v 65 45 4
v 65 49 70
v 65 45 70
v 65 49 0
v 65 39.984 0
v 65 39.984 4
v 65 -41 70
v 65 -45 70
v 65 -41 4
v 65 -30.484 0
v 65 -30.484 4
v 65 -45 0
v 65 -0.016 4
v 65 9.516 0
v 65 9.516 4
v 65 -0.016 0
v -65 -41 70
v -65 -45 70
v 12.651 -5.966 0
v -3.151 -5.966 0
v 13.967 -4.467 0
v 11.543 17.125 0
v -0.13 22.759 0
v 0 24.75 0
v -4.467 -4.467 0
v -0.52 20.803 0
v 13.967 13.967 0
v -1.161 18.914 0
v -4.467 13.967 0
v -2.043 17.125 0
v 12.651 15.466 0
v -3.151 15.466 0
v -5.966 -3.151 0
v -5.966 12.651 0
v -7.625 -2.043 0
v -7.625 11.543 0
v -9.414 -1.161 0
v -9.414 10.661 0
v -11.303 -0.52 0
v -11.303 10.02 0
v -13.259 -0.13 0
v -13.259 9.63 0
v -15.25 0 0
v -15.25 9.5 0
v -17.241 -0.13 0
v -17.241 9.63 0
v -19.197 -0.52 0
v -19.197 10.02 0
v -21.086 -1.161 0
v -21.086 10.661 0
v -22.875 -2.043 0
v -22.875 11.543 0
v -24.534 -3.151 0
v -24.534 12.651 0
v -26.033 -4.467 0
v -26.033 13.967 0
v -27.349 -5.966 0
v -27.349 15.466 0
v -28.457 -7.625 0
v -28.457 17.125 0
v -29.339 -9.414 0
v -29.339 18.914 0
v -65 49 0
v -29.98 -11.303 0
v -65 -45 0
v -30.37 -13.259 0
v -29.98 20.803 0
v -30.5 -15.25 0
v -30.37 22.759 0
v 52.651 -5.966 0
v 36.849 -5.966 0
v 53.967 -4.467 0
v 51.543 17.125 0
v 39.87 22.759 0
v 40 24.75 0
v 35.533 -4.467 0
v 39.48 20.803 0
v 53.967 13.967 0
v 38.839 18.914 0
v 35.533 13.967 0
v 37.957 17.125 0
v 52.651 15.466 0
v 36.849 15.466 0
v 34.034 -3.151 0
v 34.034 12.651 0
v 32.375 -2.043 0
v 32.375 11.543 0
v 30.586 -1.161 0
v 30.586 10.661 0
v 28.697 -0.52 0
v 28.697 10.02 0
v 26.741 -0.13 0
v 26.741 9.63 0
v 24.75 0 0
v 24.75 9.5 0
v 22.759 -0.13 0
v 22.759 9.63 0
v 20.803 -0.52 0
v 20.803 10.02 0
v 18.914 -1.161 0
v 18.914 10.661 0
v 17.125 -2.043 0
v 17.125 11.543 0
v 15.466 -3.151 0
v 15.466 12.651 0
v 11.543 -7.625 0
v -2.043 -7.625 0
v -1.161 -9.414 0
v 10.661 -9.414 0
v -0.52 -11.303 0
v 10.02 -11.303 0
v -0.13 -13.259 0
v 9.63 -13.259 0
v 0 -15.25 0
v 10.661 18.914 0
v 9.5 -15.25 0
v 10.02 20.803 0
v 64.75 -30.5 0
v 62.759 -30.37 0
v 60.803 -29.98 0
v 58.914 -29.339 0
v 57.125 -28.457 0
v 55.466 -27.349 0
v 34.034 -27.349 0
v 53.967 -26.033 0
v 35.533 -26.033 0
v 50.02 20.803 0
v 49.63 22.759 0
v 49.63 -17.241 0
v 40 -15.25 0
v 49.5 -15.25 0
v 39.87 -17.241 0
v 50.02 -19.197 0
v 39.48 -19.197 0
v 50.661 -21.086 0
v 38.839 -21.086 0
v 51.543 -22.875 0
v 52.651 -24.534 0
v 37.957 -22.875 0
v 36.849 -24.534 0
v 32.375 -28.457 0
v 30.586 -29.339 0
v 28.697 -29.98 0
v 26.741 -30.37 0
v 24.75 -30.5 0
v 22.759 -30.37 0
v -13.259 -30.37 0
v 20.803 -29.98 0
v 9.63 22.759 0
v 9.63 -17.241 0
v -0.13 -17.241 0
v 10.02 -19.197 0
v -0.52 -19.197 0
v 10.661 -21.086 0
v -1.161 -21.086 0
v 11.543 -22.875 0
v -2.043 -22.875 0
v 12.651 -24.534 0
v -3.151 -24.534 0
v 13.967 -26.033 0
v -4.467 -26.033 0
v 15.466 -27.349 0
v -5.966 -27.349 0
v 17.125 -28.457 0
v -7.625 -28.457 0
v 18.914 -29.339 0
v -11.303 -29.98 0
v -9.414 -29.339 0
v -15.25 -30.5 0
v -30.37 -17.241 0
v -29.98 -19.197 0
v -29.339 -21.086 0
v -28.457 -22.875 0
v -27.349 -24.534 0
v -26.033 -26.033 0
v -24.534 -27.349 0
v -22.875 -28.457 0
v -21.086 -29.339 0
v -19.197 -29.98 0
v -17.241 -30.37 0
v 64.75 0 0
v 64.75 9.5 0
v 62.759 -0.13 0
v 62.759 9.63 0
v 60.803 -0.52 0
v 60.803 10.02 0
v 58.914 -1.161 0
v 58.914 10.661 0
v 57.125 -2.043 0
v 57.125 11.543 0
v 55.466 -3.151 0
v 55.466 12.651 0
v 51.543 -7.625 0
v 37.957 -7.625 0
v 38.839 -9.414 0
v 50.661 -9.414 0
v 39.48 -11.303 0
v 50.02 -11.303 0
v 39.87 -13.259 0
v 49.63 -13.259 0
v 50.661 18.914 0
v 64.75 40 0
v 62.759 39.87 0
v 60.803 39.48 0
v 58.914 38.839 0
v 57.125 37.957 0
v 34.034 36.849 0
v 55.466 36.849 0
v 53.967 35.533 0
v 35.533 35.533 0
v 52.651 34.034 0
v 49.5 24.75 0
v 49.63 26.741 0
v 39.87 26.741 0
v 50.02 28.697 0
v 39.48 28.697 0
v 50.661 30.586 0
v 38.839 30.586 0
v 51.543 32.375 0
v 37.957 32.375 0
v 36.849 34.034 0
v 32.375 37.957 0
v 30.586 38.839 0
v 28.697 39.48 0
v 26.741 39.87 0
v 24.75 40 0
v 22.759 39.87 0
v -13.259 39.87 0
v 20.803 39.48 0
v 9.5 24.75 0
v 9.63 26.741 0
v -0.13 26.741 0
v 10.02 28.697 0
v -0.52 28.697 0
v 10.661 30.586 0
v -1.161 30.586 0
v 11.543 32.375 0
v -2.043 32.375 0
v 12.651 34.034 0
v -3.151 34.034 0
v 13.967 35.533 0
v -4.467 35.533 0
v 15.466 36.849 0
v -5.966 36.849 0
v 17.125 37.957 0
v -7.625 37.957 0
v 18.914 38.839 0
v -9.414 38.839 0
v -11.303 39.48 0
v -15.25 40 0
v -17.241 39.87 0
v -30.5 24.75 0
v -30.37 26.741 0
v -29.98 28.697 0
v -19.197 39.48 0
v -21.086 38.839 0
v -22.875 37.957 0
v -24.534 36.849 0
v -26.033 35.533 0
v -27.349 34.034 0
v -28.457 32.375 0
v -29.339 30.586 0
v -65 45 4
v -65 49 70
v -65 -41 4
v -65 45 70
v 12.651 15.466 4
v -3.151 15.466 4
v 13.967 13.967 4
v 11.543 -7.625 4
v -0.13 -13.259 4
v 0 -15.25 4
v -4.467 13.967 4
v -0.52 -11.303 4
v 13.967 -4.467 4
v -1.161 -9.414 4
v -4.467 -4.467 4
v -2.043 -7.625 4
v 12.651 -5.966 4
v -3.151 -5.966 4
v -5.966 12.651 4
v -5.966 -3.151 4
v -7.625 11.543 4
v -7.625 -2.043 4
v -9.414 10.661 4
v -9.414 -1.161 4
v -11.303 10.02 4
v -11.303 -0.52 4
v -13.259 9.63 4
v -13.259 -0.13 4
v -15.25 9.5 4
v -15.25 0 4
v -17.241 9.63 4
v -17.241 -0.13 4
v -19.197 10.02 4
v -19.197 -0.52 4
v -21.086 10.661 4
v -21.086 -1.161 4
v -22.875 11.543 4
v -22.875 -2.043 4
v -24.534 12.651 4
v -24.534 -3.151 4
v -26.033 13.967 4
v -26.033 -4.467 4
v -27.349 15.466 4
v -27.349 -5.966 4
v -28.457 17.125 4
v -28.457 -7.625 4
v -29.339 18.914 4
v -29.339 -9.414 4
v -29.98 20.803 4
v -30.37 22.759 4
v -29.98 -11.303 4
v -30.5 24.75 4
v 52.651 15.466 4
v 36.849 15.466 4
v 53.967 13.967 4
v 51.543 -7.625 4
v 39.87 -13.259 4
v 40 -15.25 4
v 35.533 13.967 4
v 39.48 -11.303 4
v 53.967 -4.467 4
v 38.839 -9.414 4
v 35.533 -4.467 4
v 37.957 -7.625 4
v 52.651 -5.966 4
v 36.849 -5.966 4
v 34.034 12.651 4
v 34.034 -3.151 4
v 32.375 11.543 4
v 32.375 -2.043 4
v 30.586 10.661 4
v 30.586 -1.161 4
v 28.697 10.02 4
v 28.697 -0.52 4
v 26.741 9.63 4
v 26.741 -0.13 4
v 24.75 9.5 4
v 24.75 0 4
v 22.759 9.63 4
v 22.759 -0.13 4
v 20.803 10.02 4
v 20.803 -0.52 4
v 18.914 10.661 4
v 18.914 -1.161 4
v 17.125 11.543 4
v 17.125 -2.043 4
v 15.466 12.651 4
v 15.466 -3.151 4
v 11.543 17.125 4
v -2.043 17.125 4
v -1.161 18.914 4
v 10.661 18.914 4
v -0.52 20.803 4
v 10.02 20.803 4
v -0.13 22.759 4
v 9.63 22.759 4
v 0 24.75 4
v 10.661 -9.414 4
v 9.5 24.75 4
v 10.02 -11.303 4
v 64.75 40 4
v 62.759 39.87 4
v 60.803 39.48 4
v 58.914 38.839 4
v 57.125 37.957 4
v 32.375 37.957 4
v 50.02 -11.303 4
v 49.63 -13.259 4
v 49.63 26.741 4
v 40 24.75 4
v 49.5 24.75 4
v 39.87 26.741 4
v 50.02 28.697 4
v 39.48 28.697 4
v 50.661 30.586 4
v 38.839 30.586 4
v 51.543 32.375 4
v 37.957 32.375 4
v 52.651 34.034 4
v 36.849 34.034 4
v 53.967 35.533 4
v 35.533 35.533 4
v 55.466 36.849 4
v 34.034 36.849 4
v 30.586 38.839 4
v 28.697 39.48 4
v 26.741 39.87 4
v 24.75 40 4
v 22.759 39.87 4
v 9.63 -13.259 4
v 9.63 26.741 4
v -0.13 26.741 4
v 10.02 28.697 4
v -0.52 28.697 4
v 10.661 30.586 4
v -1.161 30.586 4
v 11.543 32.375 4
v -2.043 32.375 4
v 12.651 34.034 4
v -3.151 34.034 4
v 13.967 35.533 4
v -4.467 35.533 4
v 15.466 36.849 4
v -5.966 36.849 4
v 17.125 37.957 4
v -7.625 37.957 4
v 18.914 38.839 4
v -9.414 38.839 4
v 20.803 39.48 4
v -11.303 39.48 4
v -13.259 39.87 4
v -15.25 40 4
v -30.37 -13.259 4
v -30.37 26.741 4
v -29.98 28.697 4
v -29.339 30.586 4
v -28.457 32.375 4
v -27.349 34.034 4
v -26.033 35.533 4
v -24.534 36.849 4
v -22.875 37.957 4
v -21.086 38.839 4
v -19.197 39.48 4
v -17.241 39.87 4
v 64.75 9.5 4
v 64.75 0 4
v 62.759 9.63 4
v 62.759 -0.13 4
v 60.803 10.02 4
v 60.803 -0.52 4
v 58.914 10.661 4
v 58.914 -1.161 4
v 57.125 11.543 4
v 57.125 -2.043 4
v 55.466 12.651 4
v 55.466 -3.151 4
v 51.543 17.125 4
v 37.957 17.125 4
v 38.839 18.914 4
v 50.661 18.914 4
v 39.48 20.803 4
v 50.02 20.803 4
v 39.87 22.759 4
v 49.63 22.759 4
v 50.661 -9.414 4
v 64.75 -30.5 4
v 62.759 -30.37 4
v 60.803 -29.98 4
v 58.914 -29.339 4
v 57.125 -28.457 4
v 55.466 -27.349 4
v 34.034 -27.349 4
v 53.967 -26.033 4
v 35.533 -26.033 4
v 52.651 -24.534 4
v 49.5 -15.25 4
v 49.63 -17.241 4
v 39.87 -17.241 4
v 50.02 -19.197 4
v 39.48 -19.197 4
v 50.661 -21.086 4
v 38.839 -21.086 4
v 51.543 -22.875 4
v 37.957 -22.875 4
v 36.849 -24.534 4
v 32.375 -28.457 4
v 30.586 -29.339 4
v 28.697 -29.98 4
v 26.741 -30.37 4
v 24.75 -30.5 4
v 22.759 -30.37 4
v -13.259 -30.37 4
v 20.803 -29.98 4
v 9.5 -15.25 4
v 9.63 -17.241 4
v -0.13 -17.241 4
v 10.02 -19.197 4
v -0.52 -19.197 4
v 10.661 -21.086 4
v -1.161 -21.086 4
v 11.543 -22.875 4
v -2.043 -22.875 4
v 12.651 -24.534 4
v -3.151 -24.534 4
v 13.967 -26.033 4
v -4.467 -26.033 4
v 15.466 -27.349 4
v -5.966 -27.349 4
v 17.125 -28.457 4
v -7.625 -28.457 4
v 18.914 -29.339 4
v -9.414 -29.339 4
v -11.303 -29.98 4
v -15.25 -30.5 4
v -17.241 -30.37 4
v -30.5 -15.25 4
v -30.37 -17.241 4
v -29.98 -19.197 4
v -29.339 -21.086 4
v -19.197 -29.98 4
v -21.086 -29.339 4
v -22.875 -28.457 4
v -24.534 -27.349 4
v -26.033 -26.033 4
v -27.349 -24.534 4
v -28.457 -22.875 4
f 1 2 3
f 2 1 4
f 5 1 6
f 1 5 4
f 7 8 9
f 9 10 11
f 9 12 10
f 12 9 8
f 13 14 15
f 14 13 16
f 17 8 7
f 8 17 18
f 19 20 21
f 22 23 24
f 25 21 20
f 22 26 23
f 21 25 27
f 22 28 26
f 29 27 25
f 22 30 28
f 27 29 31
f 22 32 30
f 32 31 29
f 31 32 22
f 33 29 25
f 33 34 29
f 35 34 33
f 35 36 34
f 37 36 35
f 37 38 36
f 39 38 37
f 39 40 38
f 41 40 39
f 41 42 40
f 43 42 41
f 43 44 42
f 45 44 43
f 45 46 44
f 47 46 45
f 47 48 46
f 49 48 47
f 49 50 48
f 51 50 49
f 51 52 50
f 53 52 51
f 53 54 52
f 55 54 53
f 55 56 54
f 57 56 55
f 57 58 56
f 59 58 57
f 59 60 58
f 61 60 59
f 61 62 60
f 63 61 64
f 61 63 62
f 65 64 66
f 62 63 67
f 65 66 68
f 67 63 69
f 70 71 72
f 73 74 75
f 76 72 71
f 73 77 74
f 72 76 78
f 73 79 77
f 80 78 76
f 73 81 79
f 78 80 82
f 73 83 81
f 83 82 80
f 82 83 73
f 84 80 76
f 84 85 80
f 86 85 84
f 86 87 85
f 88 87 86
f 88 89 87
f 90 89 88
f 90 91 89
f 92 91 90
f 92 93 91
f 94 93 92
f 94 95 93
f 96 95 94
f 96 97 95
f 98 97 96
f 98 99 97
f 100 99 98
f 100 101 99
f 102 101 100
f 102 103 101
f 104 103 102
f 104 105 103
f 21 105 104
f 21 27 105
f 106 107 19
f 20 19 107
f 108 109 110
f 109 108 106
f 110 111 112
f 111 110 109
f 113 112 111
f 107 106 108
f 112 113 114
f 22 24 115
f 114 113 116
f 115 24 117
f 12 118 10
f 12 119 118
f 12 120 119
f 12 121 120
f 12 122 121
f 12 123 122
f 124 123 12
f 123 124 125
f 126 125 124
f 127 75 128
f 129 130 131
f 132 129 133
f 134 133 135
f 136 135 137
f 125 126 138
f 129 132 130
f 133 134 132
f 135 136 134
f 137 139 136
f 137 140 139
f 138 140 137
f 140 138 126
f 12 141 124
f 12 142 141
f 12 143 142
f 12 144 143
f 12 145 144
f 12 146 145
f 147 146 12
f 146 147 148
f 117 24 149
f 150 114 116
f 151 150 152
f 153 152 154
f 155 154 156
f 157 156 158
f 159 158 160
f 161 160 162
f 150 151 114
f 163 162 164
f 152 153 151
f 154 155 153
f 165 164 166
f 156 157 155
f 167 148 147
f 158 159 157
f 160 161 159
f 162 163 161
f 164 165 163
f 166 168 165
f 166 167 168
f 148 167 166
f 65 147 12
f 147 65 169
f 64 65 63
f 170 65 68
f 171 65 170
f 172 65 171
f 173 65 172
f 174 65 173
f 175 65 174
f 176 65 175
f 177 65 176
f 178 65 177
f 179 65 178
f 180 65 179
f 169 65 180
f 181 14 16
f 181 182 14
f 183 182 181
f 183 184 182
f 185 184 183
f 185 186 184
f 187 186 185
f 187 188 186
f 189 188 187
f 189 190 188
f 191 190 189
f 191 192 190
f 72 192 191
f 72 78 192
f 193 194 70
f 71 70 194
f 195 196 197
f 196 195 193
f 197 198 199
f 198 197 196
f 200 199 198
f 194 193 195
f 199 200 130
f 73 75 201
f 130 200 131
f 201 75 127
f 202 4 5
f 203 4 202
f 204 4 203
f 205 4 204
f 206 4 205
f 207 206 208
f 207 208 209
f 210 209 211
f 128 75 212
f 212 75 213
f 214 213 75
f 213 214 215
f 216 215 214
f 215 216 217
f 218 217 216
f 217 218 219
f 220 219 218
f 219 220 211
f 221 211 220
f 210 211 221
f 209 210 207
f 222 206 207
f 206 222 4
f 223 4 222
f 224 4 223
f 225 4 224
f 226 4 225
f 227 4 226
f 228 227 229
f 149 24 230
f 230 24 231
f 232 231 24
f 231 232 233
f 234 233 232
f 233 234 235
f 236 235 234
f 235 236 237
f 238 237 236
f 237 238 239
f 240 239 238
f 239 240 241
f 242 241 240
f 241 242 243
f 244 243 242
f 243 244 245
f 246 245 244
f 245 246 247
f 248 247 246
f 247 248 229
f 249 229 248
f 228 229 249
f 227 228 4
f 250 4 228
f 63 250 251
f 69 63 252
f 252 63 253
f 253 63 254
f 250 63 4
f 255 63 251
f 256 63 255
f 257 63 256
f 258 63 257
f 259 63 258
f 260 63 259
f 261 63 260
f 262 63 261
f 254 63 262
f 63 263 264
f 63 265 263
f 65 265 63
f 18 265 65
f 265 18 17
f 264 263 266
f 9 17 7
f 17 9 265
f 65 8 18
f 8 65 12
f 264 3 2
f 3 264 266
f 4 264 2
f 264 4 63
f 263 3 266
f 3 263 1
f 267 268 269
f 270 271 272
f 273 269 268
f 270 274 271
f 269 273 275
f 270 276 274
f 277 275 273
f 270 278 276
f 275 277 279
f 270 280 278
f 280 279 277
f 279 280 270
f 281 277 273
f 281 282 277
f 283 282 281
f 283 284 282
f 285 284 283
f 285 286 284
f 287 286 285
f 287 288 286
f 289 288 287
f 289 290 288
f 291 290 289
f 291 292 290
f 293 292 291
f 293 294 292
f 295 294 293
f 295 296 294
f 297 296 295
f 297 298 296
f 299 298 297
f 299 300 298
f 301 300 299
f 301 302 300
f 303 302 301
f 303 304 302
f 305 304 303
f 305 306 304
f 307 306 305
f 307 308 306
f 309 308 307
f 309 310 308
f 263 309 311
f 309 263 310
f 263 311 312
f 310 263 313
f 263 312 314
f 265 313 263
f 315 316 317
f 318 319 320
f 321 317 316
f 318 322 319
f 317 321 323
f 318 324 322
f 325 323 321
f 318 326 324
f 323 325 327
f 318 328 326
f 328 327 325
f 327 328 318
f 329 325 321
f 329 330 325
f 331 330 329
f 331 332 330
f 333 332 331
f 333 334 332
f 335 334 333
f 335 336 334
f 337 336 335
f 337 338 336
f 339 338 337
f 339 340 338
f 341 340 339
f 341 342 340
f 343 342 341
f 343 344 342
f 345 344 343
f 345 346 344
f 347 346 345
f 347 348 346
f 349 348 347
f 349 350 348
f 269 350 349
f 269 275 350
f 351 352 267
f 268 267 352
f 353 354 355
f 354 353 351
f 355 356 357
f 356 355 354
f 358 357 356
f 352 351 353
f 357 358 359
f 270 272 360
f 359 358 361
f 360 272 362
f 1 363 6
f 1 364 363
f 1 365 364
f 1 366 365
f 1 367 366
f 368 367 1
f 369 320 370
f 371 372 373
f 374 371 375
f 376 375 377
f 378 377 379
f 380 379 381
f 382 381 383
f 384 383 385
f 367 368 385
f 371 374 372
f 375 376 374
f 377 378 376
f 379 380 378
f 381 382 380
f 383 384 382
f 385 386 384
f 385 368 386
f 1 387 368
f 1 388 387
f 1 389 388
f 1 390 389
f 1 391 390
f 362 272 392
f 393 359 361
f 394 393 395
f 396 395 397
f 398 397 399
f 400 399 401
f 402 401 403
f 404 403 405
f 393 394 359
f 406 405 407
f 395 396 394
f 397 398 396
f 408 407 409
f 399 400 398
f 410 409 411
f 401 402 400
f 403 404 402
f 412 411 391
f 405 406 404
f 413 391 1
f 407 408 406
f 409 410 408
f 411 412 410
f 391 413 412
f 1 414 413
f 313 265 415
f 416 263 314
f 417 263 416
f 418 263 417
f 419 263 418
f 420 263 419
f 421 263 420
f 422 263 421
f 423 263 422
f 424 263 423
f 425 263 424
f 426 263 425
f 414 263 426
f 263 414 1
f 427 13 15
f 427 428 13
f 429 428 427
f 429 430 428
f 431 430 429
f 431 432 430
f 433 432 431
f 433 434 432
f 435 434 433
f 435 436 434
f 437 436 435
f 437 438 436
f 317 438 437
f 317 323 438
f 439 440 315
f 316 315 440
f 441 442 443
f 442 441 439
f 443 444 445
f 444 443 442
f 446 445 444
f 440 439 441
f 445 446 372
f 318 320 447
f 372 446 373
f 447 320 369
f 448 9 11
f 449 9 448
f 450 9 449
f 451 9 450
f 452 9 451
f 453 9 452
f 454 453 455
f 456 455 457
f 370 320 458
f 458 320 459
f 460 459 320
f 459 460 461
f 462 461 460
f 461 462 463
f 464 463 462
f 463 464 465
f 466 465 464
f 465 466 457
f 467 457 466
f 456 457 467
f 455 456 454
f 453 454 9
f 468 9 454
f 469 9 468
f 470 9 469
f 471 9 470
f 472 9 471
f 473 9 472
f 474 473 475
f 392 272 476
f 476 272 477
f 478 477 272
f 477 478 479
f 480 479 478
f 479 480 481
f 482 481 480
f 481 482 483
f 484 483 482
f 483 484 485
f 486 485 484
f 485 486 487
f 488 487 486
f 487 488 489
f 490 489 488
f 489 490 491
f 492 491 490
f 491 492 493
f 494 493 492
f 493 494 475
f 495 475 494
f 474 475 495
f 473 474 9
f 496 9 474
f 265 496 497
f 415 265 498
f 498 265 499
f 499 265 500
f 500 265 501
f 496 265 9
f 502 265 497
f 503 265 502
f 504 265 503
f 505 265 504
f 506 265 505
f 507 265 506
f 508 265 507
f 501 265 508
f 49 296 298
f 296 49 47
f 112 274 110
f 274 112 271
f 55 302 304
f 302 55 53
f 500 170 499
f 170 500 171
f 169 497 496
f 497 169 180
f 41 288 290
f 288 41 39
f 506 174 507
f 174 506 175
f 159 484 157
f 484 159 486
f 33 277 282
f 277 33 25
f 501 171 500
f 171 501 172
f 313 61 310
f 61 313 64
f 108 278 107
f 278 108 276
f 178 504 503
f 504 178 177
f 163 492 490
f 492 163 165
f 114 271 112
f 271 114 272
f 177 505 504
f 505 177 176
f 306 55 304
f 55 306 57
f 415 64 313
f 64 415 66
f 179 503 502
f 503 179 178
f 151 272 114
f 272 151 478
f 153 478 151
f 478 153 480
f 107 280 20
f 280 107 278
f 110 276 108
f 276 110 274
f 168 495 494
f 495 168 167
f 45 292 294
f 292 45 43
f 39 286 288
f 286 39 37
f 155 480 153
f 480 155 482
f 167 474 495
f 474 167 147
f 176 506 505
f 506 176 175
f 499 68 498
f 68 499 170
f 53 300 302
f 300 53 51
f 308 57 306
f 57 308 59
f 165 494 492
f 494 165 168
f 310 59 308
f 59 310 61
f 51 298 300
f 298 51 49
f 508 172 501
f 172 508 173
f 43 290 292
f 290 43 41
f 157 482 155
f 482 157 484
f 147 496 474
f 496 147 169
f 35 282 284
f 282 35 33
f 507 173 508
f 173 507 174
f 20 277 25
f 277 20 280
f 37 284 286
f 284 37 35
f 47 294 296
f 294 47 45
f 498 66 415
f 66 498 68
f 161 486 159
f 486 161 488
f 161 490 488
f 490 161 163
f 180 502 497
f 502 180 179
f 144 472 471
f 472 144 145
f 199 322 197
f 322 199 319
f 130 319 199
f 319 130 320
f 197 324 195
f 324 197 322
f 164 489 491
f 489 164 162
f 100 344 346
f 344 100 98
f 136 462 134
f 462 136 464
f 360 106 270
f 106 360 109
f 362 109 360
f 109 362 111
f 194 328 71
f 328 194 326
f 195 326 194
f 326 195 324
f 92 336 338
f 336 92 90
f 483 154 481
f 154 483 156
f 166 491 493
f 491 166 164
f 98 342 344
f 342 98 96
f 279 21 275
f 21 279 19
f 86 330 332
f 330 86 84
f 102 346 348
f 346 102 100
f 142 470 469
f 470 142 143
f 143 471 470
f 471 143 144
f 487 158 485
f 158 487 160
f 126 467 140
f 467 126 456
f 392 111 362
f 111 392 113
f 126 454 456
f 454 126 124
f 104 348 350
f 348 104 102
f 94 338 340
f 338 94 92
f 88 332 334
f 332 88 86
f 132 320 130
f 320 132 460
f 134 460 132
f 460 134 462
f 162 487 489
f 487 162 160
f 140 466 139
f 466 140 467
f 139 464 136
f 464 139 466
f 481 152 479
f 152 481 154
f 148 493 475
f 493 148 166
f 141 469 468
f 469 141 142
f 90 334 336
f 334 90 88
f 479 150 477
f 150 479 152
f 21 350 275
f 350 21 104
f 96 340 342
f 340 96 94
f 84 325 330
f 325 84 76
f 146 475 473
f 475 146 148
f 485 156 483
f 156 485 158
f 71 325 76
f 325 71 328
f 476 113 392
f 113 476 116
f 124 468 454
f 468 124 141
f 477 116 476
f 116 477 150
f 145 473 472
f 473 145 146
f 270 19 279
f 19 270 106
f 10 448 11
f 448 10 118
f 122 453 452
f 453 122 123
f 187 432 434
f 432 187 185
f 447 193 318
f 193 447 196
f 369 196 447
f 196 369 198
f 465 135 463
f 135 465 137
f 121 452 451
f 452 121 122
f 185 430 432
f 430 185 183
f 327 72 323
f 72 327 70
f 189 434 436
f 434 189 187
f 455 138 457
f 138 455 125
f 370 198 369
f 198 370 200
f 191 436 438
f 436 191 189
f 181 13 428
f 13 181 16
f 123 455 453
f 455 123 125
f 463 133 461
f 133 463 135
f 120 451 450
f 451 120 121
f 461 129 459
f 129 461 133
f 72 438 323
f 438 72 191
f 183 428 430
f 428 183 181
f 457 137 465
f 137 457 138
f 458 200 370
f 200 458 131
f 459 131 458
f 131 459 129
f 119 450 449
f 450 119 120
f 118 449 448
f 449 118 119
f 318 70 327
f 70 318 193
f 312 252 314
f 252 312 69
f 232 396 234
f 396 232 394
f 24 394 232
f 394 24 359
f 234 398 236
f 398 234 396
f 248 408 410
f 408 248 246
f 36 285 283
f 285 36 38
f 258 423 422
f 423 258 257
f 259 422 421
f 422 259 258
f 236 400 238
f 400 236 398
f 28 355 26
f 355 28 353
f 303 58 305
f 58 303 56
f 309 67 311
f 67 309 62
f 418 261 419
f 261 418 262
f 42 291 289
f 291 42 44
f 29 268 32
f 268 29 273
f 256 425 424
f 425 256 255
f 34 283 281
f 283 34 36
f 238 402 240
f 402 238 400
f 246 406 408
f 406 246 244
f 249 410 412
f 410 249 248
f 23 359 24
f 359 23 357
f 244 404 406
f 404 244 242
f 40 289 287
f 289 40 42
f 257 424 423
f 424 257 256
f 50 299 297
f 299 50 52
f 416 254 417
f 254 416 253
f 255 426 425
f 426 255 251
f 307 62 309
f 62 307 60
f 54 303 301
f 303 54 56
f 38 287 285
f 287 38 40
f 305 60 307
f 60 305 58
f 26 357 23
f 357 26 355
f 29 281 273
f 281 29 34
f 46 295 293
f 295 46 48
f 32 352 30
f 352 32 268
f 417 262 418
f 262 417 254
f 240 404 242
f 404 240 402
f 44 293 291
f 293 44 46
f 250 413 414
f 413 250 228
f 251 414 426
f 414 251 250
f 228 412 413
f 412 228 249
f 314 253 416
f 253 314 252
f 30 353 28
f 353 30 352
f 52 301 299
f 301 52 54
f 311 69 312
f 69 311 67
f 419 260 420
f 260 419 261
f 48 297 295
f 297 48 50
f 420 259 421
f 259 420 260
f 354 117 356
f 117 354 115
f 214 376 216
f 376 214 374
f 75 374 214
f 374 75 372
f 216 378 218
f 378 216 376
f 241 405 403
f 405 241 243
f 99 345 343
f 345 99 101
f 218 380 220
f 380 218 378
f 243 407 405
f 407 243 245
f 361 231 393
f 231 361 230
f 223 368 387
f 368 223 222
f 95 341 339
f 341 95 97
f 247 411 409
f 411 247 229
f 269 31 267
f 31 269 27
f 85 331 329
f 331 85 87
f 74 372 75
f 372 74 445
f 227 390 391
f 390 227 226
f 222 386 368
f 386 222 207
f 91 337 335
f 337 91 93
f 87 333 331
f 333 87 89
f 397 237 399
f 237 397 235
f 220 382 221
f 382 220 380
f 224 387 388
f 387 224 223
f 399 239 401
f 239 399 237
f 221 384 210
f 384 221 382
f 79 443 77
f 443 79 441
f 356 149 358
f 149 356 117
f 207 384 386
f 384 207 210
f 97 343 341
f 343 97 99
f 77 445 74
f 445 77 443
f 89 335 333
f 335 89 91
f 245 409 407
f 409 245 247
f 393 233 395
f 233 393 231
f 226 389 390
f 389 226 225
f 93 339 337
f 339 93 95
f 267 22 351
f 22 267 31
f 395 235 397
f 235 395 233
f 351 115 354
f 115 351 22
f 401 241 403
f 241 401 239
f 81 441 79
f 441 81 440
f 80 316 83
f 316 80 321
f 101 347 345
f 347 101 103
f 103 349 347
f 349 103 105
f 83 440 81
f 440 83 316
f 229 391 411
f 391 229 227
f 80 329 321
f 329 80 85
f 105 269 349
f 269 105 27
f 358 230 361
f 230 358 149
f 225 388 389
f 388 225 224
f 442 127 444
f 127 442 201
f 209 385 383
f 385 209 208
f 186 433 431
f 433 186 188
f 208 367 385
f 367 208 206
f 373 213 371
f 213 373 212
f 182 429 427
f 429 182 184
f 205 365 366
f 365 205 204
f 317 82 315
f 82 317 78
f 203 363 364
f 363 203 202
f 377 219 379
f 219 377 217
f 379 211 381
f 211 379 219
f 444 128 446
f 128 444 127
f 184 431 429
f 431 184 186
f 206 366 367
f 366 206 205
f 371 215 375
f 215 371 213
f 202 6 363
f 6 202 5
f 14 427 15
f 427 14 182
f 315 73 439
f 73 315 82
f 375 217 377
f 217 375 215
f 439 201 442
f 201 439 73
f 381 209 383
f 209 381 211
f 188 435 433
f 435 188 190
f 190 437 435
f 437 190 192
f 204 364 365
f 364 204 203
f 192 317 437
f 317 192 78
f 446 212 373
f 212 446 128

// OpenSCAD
// Tube rack for six 50 mL conical (Falcon-type) tubes - printed upside down and flipped over.
// A flat plate with a 2x3 hole grid and two solid walls runs along the long edges. The two
// short ends are open. The walls and plate form a U-shaped channel that holds the rack upright
// when flipped. NOVEL general part.
//

plate_L = 130;
plate_W = 90;
plate_t = 4;
hole_d  = 30.5;
row_p   = 40;
col_p   = 40;
wall_h  = 70;

$fn = 48;

plate_z = 4;
wall_t  = 4;

difference() {
    union() {
        translate([-plate_L / 2, -plate_W / 2, 0]) cube([plate_L, plate_W, plate_z]);
        for (y = [-plate_W / 2, plate_W / 2])
            translate([-plate_L / 2, y, 0]) cube([plate_L, wall_t, wall_h]);
    }
    for (i = [0, 1], j = [0, 1, 2])
        translate([col_p * j - 15.25, row_p * i - 15.25, -1]) cylinder(h = plate_z + 2, d = hole_d);
}
